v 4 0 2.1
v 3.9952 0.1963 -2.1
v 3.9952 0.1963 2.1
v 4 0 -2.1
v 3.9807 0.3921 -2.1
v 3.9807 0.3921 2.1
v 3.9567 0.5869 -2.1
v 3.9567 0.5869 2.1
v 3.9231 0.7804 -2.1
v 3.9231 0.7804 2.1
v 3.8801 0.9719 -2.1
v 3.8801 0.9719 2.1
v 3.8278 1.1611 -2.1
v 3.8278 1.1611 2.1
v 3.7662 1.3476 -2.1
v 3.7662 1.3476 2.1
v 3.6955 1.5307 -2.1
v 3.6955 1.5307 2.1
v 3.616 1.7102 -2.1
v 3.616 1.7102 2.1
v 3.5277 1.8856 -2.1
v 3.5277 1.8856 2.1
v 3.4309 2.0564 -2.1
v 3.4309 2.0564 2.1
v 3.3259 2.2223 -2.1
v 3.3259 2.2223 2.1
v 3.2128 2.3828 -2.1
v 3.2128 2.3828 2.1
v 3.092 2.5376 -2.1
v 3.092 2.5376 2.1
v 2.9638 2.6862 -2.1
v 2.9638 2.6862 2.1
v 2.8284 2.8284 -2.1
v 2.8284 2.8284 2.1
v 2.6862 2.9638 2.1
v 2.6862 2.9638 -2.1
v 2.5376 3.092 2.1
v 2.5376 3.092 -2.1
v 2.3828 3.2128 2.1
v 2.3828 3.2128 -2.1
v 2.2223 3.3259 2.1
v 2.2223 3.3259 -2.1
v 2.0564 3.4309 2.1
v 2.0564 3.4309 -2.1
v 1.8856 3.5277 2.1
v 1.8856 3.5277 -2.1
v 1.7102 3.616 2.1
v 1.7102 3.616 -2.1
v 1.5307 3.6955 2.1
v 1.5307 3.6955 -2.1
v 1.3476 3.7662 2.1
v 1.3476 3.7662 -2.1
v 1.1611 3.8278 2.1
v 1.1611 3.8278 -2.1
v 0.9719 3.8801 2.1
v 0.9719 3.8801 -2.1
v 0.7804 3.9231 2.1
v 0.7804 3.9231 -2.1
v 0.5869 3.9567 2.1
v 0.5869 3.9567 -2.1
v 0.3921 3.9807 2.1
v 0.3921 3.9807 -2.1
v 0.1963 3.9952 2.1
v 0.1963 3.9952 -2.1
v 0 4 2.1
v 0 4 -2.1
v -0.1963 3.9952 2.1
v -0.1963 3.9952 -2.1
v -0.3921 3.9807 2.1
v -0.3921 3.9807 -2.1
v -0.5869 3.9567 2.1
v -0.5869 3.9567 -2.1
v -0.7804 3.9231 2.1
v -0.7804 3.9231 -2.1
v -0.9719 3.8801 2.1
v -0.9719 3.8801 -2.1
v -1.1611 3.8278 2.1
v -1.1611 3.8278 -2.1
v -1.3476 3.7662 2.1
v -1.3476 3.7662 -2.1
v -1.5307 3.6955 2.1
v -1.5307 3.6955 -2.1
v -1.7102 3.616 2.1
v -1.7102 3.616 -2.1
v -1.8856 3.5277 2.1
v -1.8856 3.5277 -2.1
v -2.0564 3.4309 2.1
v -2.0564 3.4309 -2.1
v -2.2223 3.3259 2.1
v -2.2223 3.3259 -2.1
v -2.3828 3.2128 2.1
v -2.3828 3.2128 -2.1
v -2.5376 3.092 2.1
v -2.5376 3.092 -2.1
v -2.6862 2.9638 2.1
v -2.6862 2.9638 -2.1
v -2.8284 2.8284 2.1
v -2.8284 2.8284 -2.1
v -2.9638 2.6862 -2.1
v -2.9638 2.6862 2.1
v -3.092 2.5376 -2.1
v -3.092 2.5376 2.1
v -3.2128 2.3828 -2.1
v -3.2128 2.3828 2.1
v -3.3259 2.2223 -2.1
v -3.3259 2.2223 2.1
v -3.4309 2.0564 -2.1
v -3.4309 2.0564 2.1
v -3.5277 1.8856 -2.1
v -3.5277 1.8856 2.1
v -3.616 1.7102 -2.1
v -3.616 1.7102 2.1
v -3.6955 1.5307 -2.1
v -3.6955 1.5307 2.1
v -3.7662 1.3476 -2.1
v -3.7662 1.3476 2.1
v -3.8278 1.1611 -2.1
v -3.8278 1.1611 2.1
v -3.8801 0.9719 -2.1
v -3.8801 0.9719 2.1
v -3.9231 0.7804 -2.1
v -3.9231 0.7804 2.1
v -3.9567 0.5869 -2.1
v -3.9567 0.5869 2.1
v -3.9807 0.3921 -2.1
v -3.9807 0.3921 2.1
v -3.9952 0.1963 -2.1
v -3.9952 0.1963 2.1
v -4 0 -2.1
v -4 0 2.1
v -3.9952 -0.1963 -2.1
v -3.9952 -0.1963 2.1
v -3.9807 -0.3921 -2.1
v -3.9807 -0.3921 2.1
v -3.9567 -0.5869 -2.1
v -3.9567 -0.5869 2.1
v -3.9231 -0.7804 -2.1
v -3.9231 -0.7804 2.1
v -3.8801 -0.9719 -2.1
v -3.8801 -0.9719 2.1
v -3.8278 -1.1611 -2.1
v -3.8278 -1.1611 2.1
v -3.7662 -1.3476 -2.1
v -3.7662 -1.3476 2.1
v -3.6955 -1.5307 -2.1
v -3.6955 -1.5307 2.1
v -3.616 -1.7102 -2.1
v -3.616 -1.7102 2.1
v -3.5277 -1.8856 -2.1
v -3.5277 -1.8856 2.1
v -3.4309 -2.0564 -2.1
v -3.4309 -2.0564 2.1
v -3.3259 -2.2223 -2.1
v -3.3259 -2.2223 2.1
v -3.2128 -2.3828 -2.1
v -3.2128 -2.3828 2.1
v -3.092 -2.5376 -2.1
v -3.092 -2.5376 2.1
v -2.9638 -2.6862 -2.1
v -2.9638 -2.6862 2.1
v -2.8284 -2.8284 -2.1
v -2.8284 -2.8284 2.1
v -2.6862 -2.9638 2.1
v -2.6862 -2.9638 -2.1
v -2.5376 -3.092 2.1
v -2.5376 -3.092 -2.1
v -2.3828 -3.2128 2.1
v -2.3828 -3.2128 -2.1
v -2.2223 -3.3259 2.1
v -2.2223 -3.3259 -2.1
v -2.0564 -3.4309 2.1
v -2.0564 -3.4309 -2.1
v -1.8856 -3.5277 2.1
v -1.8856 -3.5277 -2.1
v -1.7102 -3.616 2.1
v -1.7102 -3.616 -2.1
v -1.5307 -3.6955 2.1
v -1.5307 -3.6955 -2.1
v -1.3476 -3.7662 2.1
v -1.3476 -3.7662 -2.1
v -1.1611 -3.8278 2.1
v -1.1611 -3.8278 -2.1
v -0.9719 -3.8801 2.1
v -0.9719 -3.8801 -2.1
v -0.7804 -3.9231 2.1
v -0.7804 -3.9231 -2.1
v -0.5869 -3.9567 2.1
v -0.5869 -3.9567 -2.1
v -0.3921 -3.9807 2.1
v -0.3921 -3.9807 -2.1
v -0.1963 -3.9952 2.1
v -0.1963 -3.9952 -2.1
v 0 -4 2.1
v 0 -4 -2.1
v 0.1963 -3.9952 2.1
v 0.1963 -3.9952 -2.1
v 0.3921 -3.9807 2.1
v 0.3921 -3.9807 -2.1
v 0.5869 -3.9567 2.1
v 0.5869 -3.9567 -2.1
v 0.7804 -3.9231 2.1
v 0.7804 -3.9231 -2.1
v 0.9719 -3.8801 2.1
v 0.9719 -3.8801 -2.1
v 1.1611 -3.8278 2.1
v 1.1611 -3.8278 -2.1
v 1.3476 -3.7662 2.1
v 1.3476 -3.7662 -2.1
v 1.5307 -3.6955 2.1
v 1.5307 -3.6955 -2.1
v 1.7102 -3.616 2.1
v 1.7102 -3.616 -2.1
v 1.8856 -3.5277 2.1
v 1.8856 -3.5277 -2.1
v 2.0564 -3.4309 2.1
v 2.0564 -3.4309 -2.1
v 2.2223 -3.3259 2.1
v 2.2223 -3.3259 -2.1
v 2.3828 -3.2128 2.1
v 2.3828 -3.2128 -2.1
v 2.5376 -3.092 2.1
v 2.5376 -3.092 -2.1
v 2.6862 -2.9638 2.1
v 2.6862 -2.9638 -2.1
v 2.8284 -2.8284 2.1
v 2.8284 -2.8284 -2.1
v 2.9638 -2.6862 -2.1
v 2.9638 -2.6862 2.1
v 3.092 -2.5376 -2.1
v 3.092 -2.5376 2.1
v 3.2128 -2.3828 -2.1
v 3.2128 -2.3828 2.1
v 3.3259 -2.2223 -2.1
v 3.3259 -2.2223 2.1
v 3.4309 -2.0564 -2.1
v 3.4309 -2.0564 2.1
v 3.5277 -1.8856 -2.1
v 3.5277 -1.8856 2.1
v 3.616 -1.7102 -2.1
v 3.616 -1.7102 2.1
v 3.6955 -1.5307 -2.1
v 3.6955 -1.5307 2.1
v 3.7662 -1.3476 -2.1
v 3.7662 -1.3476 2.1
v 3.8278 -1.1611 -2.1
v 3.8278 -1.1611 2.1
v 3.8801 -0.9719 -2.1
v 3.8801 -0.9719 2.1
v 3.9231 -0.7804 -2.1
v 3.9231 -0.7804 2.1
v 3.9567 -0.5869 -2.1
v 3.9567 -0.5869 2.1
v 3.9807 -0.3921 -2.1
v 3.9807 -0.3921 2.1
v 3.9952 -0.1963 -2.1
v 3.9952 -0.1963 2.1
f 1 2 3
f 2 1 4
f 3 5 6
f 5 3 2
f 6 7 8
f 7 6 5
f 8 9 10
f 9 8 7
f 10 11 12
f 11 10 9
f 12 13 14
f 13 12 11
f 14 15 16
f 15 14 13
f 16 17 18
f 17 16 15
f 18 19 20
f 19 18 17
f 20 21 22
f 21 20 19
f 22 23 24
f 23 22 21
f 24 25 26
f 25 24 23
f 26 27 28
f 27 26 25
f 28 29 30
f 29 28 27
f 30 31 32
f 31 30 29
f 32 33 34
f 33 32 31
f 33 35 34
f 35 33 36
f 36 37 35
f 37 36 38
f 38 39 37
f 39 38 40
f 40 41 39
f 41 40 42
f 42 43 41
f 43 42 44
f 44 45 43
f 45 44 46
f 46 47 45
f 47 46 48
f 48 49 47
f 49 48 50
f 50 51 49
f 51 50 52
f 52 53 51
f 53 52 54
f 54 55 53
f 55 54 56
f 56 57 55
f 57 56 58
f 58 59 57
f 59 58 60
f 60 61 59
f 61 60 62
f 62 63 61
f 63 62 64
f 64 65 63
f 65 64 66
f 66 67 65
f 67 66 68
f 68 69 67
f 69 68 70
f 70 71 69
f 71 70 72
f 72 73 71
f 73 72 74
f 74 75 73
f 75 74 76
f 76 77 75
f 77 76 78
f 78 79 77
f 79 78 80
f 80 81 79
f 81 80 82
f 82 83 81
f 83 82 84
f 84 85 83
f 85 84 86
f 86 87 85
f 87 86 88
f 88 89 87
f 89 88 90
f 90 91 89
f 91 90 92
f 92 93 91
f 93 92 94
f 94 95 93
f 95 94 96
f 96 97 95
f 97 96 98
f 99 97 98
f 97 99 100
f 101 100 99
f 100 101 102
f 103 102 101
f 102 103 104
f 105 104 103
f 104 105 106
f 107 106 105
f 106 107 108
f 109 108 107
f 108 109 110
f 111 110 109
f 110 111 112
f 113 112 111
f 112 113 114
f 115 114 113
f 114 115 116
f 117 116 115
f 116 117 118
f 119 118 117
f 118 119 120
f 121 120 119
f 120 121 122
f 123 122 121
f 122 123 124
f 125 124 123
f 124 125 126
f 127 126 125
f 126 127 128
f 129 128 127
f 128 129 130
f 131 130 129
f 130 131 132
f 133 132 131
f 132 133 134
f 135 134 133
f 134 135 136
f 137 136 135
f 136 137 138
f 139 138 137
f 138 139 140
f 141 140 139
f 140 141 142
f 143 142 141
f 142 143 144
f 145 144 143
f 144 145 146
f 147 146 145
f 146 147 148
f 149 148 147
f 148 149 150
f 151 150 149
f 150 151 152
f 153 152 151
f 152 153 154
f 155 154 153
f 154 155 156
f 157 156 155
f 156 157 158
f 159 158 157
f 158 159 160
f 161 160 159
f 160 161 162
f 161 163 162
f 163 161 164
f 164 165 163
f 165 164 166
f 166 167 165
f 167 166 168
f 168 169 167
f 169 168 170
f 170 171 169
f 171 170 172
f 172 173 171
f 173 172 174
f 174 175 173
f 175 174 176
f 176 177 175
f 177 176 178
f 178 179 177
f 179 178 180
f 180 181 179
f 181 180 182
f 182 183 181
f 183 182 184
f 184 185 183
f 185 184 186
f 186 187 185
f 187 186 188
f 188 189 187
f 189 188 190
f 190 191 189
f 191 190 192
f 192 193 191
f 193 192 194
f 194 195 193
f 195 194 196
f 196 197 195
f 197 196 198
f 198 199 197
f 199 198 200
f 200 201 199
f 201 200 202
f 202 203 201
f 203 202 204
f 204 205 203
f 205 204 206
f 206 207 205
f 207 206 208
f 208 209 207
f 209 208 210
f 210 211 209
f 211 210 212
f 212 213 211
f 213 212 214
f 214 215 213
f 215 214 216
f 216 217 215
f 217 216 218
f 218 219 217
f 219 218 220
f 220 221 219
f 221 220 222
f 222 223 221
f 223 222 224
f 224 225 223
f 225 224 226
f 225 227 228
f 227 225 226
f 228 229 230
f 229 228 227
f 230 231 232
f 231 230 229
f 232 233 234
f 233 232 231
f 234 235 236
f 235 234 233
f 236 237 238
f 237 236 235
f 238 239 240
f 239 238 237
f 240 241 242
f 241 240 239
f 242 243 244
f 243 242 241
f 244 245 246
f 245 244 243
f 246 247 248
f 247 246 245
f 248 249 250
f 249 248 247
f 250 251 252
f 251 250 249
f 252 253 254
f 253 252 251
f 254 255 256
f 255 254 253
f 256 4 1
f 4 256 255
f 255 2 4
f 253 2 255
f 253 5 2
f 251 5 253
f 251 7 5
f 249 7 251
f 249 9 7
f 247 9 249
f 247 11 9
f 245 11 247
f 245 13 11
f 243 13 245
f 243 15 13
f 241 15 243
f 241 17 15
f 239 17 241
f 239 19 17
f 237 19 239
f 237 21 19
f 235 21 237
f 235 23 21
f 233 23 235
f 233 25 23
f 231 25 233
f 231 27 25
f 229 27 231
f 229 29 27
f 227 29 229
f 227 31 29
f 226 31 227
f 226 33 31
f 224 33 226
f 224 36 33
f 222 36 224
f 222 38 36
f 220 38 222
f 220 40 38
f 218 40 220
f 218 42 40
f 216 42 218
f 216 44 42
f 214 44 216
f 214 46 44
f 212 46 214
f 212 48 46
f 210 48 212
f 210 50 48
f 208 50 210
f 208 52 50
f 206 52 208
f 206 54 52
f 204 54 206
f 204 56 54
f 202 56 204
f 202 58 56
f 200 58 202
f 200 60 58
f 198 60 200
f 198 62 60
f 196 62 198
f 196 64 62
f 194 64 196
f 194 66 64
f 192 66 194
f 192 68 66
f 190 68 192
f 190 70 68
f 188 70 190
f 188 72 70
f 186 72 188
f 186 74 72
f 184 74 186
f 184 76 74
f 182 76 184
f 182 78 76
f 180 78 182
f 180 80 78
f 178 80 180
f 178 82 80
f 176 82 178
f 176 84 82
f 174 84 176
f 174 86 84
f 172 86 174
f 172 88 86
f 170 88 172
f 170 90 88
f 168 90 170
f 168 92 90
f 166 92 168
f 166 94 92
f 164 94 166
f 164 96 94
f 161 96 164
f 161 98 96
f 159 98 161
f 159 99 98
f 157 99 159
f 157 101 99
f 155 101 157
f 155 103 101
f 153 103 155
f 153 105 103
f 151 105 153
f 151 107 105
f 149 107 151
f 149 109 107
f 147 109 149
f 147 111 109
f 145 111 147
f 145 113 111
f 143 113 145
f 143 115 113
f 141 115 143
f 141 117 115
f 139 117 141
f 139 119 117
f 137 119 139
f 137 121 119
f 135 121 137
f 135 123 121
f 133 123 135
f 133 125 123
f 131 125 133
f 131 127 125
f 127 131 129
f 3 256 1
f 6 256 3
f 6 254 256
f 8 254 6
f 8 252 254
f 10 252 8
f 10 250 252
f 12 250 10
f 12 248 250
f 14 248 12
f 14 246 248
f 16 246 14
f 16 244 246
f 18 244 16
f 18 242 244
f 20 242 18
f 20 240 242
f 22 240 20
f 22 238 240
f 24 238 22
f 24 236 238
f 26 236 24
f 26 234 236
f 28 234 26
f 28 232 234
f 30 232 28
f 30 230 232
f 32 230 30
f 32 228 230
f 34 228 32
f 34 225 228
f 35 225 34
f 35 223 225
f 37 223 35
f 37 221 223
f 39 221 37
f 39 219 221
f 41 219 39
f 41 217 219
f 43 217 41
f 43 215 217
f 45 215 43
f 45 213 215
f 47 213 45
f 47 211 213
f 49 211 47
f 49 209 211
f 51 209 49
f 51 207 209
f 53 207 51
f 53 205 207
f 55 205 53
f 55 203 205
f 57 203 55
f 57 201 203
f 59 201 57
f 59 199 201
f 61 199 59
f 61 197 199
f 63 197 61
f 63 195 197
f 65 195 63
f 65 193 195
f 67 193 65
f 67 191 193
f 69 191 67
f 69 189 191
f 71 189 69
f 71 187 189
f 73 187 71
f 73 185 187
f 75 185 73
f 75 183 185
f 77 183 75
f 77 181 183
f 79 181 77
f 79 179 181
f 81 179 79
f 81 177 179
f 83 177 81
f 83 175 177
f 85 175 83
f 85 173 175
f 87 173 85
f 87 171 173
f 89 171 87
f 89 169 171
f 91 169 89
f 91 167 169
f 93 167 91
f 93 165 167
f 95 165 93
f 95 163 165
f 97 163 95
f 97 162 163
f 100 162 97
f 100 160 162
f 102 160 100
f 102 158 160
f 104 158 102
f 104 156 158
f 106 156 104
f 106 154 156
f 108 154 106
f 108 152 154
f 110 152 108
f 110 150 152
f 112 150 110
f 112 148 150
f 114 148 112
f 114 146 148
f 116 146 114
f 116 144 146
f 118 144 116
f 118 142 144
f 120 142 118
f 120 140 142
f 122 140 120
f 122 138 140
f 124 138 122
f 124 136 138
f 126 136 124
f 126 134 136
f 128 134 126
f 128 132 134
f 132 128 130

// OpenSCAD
$fn=128;

module permanent_magnet(d=8.0, h=4.2){
    cylinder(d=d, h=h, center=true);
}

permanent_magnet();
